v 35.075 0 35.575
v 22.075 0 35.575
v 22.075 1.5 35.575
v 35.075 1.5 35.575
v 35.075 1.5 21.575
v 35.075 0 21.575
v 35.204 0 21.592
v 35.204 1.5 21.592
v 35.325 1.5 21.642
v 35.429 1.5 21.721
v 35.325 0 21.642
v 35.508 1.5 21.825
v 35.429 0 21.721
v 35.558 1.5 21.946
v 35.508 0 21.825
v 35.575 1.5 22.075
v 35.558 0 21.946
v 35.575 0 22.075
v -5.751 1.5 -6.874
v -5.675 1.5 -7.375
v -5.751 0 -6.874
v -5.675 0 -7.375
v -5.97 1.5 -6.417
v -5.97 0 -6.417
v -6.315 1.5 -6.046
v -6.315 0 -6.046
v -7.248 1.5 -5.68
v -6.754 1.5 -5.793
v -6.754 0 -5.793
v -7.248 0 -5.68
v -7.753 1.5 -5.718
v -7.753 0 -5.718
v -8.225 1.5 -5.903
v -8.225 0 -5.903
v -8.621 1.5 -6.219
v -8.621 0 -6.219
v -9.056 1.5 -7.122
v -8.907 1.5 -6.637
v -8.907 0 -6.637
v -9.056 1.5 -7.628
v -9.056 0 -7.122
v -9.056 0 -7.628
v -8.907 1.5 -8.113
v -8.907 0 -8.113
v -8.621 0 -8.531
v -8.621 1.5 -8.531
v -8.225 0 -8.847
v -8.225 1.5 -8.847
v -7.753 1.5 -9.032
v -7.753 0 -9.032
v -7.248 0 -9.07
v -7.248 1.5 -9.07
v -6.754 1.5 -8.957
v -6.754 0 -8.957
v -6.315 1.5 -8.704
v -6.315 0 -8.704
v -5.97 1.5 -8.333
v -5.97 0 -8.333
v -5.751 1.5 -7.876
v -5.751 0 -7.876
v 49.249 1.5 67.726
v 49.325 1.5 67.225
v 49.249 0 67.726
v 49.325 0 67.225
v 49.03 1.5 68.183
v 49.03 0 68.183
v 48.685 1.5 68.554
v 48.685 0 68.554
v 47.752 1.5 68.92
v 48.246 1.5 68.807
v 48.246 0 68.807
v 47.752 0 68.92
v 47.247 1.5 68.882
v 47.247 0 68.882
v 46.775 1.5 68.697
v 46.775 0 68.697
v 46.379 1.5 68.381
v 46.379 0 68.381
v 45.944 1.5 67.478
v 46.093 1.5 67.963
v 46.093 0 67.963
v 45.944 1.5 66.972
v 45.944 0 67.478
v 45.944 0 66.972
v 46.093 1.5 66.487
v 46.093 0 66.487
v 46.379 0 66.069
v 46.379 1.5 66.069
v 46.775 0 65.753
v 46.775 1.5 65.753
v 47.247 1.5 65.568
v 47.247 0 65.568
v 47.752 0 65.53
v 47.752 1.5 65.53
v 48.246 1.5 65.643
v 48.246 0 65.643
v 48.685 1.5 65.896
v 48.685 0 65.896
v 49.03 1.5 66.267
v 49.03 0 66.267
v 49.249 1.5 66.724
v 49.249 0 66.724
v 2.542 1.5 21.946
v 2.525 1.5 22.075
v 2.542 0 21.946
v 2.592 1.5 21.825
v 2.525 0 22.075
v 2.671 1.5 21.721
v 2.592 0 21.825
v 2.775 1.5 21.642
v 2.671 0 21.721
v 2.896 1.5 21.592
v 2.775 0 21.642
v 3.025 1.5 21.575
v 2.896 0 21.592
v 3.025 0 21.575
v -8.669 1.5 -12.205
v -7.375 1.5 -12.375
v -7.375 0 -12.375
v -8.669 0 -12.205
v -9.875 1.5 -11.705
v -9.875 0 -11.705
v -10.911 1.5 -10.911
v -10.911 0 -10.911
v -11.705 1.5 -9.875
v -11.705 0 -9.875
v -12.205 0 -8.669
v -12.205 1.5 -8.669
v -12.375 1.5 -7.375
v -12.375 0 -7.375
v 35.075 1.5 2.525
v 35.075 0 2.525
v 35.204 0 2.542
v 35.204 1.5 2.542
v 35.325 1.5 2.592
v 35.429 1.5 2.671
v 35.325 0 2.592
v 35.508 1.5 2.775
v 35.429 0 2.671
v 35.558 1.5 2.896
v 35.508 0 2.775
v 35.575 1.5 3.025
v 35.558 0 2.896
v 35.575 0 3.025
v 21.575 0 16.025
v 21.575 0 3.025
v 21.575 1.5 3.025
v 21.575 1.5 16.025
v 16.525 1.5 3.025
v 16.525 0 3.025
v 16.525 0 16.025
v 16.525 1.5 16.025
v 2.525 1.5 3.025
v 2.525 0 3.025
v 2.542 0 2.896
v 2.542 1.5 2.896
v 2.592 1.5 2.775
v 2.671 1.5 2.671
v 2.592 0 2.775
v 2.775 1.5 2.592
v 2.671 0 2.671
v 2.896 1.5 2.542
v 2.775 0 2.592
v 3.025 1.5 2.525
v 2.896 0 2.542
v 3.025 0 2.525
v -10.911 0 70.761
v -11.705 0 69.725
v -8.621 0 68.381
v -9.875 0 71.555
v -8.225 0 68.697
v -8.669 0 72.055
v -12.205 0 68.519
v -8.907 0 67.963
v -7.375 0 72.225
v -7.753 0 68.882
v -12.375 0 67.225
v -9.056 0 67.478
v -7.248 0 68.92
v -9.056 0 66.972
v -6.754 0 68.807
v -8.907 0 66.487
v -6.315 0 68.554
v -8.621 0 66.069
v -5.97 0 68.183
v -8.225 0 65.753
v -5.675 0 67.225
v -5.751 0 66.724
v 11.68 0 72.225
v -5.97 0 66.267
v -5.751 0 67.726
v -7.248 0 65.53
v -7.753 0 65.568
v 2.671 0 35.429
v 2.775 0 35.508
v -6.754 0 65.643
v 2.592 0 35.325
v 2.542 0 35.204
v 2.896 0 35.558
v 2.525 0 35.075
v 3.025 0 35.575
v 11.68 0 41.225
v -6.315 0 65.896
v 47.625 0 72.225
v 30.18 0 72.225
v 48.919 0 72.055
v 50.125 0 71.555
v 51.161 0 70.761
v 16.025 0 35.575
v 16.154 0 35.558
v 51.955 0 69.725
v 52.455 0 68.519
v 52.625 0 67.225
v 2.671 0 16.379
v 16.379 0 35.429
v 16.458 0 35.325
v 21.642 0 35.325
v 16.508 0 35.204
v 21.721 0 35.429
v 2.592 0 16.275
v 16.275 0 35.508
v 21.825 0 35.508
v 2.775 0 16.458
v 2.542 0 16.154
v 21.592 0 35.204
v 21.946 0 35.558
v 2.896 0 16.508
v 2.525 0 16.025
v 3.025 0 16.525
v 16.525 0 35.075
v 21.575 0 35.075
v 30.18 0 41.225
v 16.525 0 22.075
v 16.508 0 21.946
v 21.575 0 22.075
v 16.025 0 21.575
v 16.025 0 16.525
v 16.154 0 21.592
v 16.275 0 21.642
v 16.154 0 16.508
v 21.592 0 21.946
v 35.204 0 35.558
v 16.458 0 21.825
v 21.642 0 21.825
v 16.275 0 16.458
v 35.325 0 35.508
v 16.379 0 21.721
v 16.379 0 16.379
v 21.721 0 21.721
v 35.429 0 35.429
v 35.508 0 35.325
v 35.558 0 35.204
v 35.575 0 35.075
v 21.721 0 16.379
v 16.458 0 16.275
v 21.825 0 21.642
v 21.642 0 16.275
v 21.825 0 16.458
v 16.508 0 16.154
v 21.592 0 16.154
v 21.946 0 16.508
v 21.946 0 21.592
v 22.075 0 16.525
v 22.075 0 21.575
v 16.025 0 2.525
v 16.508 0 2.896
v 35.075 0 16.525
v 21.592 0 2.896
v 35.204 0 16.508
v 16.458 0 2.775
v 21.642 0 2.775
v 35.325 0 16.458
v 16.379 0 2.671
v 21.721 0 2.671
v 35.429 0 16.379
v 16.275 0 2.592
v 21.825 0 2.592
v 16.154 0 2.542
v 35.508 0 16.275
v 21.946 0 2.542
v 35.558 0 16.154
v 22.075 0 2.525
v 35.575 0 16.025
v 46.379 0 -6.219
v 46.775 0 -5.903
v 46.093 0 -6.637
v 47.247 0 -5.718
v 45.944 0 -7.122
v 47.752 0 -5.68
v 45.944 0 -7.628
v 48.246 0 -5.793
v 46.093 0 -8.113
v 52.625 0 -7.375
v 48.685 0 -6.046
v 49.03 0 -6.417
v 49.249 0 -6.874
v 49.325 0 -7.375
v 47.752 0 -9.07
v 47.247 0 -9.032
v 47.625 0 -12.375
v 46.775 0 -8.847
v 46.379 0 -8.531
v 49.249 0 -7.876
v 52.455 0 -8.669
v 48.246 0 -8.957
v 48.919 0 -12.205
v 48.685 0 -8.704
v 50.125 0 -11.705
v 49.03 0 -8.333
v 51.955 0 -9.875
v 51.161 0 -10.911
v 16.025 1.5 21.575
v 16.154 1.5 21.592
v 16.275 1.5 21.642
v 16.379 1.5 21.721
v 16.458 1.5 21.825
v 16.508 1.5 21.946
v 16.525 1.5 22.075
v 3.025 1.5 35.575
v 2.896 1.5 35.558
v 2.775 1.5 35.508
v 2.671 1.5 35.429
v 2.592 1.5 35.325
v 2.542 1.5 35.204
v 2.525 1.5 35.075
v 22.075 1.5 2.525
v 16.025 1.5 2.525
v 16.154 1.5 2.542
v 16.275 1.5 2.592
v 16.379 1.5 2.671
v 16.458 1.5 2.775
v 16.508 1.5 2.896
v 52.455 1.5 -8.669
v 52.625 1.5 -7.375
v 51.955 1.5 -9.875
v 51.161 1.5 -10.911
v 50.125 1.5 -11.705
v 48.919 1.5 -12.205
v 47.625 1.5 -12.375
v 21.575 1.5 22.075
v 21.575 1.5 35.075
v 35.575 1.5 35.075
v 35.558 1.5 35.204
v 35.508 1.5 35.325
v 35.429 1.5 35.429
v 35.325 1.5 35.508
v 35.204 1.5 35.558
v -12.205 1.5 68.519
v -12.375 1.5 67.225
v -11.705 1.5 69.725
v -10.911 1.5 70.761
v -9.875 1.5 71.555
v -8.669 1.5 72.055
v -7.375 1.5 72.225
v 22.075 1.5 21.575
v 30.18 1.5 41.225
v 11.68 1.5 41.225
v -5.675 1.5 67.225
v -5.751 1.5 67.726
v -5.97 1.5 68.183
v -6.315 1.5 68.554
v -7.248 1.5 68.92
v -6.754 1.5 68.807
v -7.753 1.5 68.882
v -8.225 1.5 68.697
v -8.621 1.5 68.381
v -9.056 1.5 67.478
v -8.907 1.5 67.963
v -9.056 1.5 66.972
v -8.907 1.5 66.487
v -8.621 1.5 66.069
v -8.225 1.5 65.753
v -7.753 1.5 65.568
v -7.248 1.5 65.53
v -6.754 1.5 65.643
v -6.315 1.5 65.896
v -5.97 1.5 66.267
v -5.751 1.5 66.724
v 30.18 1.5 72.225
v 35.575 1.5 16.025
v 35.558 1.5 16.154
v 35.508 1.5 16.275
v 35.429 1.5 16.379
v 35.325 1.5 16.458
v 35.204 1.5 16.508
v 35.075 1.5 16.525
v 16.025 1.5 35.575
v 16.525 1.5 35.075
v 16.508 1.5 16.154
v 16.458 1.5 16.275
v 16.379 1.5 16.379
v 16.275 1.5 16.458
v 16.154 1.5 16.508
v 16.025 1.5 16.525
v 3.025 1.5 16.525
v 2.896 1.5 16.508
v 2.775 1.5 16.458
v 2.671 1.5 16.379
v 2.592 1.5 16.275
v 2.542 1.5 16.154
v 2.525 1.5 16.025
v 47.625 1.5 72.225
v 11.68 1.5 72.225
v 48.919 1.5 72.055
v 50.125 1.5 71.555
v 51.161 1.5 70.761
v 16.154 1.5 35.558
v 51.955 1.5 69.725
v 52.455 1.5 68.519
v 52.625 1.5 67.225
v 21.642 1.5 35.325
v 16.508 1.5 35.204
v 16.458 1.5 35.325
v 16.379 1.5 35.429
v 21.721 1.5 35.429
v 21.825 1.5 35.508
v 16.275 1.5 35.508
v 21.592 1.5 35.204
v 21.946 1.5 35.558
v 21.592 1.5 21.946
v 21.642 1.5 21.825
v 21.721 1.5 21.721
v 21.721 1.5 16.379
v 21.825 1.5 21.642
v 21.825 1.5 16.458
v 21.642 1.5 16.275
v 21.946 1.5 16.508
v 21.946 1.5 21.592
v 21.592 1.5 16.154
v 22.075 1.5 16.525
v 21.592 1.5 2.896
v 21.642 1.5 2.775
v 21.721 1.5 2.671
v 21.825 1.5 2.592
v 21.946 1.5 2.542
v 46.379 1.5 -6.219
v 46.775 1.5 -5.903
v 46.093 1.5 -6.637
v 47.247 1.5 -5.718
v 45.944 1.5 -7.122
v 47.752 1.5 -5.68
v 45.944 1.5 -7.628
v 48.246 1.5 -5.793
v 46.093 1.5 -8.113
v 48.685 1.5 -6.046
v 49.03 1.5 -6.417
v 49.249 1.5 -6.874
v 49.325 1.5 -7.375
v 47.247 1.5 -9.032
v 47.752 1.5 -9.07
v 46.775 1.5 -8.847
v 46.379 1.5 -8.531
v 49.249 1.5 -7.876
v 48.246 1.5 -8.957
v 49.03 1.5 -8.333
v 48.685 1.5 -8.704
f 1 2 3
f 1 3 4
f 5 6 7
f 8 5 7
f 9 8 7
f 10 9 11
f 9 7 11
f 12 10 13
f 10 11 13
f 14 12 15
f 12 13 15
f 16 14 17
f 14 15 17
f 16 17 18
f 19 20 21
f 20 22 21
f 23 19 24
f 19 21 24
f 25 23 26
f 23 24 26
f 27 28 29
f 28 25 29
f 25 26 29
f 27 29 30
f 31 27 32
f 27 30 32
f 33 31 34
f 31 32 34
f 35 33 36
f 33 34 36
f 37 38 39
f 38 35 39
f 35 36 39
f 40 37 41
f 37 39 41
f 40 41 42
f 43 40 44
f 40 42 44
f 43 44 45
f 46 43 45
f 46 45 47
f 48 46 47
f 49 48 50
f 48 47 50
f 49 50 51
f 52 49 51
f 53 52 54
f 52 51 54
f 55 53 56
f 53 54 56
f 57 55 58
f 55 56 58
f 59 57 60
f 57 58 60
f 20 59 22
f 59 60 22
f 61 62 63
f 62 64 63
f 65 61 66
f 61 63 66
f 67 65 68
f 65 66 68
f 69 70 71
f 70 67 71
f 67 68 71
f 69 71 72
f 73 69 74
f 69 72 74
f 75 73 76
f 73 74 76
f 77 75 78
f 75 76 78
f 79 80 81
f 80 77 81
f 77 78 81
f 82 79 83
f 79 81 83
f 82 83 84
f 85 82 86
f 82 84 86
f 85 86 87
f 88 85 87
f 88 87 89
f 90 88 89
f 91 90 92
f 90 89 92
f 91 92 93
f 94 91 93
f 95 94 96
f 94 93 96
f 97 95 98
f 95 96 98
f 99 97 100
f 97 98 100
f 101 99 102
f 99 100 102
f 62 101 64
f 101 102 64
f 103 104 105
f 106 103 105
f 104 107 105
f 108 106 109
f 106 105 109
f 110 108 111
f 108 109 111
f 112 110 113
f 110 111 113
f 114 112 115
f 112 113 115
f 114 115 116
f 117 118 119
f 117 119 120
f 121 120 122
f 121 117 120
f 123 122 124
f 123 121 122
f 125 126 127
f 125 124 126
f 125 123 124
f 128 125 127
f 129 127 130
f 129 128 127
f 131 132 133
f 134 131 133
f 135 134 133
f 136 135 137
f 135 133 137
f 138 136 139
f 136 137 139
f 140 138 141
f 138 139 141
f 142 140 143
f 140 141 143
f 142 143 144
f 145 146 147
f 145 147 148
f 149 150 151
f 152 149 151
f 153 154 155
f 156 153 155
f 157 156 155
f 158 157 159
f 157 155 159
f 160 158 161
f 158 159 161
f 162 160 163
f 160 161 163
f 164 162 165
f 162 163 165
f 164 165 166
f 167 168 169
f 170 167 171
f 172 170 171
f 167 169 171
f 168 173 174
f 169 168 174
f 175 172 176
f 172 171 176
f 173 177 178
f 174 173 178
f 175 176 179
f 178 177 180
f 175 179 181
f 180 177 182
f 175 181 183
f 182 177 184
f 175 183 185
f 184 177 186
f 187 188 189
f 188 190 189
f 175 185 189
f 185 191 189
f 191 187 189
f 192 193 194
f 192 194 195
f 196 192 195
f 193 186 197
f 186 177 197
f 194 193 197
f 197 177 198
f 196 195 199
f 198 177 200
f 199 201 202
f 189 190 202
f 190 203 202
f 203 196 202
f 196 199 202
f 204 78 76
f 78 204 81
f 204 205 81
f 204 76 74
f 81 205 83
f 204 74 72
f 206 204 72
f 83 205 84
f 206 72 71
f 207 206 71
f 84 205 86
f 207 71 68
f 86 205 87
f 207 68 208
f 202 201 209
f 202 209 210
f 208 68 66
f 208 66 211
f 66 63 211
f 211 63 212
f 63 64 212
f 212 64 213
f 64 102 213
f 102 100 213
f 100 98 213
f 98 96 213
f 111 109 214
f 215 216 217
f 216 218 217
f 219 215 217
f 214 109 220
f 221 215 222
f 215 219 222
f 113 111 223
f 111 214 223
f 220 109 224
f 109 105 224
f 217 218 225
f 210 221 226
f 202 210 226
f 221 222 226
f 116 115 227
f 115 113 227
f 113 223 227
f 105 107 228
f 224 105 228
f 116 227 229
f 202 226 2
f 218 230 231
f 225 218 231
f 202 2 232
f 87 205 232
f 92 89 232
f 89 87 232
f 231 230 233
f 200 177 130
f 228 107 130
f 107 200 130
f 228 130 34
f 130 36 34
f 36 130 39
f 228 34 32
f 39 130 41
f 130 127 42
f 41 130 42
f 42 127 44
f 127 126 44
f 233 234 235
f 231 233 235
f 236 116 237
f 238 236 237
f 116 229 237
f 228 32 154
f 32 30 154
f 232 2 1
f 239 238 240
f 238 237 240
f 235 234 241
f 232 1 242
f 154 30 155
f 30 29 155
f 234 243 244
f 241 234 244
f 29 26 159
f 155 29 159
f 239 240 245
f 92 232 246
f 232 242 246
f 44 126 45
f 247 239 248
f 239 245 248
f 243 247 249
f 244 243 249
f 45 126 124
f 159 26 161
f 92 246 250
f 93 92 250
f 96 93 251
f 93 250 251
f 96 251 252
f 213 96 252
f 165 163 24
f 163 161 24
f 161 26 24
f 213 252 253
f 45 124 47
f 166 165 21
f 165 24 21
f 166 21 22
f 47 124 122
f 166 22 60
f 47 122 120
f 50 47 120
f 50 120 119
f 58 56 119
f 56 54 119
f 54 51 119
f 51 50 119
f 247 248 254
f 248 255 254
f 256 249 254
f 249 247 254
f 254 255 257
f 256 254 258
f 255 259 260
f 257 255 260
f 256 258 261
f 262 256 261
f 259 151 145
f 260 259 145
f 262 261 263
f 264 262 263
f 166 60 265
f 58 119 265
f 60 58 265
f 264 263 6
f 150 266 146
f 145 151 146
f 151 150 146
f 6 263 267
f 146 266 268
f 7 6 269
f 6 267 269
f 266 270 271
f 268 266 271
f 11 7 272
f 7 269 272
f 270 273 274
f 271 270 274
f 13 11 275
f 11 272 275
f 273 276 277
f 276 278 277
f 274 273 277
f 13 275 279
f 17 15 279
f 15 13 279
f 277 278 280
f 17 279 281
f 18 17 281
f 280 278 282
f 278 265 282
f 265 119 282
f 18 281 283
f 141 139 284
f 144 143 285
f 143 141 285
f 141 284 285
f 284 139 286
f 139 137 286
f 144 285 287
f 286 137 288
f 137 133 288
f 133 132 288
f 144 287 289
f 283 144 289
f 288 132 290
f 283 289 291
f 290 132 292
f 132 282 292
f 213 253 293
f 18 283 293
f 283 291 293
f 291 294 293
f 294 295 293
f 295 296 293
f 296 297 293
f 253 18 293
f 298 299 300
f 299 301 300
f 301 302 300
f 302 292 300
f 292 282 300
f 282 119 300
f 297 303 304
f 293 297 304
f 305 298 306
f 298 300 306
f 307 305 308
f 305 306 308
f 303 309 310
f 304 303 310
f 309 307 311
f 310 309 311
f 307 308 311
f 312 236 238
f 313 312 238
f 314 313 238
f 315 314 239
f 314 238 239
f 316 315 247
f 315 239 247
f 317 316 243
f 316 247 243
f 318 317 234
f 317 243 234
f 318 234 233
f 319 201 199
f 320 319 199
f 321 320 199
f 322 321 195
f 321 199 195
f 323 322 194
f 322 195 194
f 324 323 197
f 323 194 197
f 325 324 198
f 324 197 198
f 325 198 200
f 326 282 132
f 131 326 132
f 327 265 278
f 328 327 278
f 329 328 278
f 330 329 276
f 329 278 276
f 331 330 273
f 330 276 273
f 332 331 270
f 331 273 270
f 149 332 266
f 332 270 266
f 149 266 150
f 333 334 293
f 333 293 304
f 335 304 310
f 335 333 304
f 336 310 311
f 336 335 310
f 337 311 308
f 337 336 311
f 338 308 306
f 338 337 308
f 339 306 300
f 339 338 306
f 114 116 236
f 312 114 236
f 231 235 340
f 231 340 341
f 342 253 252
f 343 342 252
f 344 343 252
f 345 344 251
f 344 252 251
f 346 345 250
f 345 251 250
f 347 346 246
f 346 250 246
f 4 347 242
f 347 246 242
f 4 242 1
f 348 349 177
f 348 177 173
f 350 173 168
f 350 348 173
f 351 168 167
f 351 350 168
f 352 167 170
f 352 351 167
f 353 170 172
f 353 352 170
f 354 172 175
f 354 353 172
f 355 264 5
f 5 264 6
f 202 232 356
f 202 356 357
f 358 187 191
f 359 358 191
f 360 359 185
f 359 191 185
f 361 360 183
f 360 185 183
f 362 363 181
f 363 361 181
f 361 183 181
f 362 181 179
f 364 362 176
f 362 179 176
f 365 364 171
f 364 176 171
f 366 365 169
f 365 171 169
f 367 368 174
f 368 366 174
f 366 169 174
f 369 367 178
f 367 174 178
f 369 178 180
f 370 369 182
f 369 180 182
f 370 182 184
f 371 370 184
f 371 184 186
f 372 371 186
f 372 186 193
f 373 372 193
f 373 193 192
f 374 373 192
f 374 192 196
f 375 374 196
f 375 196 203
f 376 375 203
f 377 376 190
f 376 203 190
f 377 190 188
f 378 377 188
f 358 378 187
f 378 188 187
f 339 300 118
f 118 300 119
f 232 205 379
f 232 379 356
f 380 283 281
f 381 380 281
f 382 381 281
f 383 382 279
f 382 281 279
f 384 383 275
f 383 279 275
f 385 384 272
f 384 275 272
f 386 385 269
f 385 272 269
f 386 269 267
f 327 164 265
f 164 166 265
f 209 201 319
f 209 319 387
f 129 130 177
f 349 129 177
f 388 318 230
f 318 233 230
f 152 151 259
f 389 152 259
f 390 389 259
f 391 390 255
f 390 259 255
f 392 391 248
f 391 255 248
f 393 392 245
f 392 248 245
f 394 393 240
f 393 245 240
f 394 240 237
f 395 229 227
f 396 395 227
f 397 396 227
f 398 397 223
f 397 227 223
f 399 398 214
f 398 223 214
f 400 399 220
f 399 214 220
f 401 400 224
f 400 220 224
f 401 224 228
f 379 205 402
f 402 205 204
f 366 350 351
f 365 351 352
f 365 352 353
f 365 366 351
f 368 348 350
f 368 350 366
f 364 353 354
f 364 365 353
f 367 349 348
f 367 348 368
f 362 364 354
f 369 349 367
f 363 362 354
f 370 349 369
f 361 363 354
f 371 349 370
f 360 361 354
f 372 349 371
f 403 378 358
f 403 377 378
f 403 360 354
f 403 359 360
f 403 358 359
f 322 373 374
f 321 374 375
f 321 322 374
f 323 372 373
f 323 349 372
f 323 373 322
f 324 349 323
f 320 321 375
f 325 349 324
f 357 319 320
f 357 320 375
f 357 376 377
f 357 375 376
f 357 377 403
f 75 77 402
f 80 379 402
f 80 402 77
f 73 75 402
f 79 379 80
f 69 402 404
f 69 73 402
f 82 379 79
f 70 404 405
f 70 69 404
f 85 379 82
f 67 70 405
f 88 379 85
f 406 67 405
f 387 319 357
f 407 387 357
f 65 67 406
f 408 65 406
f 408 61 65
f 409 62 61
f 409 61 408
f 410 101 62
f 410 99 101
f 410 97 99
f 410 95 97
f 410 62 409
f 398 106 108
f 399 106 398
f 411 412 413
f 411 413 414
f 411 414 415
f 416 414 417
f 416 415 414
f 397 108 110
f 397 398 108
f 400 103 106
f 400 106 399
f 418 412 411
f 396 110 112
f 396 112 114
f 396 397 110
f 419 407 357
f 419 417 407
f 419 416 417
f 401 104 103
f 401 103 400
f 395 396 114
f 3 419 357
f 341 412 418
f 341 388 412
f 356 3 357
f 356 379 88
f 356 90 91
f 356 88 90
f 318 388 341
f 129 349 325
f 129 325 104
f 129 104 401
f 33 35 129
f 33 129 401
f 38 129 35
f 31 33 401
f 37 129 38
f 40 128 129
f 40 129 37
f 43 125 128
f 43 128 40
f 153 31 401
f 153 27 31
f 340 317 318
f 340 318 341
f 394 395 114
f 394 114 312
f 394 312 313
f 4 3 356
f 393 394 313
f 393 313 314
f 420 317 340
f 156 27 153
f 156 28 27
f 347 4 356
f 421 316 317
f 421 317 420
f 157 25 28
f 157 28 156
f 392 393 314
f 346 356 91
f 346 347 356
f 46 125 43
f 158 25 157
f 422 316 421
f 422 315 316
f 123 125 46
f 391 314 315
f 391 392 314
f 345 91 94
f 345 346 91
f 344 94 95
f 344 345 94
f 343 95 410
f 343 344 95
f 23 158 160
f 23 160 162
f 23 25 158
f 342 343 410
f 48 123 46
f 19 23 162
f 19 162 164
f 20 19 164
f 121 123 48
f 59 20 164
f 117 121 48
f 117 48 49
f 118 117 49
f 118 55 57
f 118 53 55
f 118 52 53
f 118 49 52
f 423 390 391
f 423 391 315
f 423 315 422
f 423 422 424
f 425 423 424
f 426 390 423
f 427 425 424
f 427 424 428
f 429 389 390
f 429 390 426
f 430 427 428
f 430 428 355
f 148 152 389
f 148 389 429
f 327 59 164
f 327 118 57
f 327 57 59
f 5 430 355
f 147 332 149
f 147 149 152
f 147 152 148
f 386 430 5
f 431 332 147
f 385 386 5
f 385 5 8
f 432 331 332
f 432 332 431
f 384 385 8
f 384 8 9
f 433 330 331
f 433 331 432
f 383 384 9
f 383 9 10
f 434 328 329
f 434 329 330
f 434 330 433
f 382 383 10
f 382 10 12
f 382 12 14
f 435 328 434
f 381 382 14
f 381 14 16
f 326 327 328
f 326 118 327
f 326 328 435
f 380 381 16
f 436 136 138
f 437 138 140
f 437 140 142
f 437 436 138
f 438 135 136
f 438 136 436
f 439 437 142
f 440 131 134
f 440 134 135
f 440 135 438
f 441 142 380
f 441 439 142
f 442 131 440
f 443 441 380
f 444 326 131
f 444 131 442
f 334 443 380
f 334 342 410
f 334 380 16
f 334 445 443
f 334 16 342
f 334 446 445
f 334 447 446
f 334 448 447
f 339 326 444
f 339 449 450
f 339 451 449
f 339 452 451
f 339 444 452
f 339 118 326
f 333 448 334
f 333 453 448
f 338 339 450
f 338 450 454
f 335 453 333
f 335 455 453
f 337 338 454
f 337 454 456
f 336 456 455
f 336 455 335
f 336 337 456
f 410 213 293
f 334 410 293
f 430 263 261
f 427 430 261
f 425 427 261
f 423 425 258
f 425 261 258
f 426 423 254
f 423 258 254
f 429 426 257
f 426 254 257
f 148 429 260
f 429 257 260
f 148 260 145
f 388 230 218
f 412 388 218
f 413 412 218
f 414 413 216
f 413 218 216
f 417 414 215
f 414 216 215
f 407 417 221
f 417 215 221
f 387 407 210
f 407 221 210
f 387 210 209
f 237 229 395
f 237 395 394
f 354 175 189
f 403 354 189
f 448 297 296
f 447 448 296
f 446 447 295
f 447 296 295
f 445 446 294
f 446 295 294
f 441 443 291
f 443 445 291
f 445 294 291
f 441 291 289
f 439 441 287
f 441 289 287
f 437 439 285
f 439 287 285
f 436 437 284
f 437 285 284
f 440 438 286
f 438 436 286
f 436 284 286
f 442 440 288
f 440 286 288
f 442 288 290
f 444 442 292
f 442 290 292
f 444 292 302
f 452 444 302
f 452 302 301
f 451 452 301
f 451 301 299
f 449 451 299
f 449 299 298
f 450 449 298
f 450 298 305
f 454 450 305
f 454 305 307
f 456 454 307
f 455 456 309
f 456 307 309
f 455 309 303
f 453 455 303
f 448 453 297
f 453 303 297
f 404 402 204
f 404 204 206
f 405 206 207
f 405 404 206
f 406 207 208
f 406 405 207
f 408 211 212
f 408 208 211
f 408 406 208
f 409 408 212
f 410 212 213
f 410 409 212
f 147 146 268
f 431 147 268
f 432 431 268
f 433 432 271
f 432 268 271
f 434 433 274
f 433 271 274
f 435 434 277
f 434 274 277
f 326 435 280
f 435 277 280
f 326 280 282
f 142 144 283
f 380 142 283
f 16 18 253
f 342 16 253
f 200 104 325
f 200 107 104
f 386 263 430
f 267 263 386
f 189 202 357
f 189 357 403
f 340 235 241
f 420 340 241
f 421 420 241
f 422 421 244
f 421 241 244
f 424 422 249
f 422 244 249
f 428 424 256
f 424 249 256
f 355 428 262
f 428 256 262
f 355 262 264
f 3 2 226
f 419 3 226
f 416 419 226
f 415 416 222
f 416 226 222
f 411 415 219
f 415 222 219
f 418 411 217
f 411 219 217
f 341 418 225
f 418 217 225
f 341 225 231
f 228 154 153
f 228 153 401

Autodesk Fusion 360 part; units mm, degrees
sketch "plate-2025-12-11T20_48_07.428Z" plane through (0, 0, 0) normal (0, 1, 0) x (1, 0, 0)
sketch "plate-2025-12-11T20_48_07.428Z (1)" plane through (0, 0, 0) normal (0, 1, 0) x (1, 0, 0)
  line L0 (3.025, -2.525) -> (16.025, -2.525)
  line L1 (3.025, -16.525) -> (16.025, -16.525)
  line L2 (2.525, -3.025) -> (2.525, -16.025)
  line L3 (16.525, -3.025) -> (16.525, -16.025)
  arc A0 (3.025, -2.525) -> (2.525, -3.025) centre (3.025, -3.025) ccw
  arc A1 (16.525, -3.025) -> (16.025, -2.525) centre (16.025, -3.025) ccw
  arc A2 (2.525, -16.025) -> (3.025, -16.525) centre (3.025, -16.025) ccw
  arc A3 (16.025, -16.525) -> (16.525, -16.025) centre (16.025, -16.025) ccw
  line L4 (22.075, -2.525) -> (35.075, -2.525)
  line L5 (22.075, -16.525) -> (35.075, -16.525)
  line L6 (21.575, -3.025) -> (21.575, -16.025)
  line L7 (35.575, -3.025) -> (35.575, -16.025)
  arc A4 (22.075, -2.525) -> (21.575, -3.025) centre (22.075, -3.025) ccw
  arc A5 (35.575, -3.025) -> (35.075, -2.525) centre (35.075, -3.025) ccw
  arc A6 (21.575, -16.025) -> (22.075, -16.525) centre (22.075, -16.025) ccw
  arc A7 (35.075, -16.525) -> (35.575, -16.025) centre (35.075, -16.025) ccw
  line L8 (3.025, -21.575) -> (16.025, -21.575)
  line L9 (3.025, -35.575) -> (16.025, -35.575)
  line L10 (2.525, -22.075) -> (2.525, -35.075)
  line L11 (16.525, -22.075) -> (16.525, -35.075)
  arc A8 (3.025, -21.575) -> (2.525, -22.075) centre (3.025, -22.075) ccw
  arc A9 (16.525, -22.075) -> (16.025, -21.575) centre (16.025, -22.075) ccw
  arc A10 (2.525, -35.075) -> (3.025, -35.575) centre (3.025, -35.075) ccw
  arc A11 (16.025, -35.575) -> (16.525, -35.075) centre (16.025, -35.075) ccw
  line L12 (22.075, -21.575) -> (35.075, -21.575)
  line L13 (22.075, -35.575) -> (35.075, -35.575)
  line L14 (21.575, -22.075) -> (21.575, -35.075)
  line L15 (35.575, -22.075) -> (35.575, -35.075)
  arc A12 (22.075, -21.575) -> (21.575, -22.075) centre (22.075, -22.075) ccw
  arc A13 (35.575, -22.075) -> (35.075, -21.575) centre (35.075, -22.075) ccw
  arc A14 (21.575, -35.075) -> (22.075, -35.575) centre (22.075, -35.075) ccw
  arc A15 (35.075, -35.575) -> (35.575, -35.075) centre (35.075, -35.075) ccw
sketch "Sketch5" plane through (0, 0, 0) normal (0, 1, 0) x (1, 0, 0)
  line L0 (-12.375, -72.225) -> (52.625, -72.225)
  line L1 (52.625, -72.225) -> (52.625, 12.375)
  line L2 (52.625, 12.375) -> (-12.375, 12.375)
  line L3 (-12.375, 12.375) -> (-12.375, -72.225)
  line L4 (3.025, -2.525) -> (16.025, -2.525)
  line L5 (2.525, -3.025) -> (2.525, -16.025)
  line L6 (11.68, -72.225) -> (30.18, -72.225)
  line L7 (30.18, -72.225) -> (30.18, -41.225)
  line L8 (30.18, -41.225) -> (11.68, -41.225)
  line L9 (11.68, -41.225) -> (11.68, -72.225)
  circle A0 centre (-7.375, -67.225) radius 1.7
  circle A1 centre (47.625, -67.225) radius 1.7
  circle A2 centre (47.625, 7.375) radius 1.7
  circle A3 centre (-7.375, 7.375) radius 1.7
  dimension "d1" = 84.6
  dimension "d2" = 65
  dimension "d3" = 14.9
  dimension "d4" = 14.9
  dimension "d5" = 31
  dimension "d6" = 18.5
  dimension "d7" = 24.055
  dimension "d8" = 3.4
  dimension "d9" = 5
  dimension "d10" = 3.4
  dimension "d11" = 5
  dimension "d12" = 3.4
  dimension "d13" = 5
  dimension "d14" = 3.4
  dimension "d15" = 5
  dimension "d16" = 5
  dimension "d17" = 5
  dimension "d18" = 5
  dimension "d19" = 5
extrude "Extrude1" add sketch "Sketch5" along normal blind 1.5 contours L0 L1 L2 L3 L7 L8 L9
extrude "Extrude2" cut sketch "plate-2025-12-11T20_48_07.428Z (1)" along normal through all
fillet "Fillet1" radius 5 4 edges at (-12.375, 0.75, 72.225) (52.625, 0.75, 72.225) (52.625, 0.75, -12.375) (-12.375, 0.75, -12.375)
